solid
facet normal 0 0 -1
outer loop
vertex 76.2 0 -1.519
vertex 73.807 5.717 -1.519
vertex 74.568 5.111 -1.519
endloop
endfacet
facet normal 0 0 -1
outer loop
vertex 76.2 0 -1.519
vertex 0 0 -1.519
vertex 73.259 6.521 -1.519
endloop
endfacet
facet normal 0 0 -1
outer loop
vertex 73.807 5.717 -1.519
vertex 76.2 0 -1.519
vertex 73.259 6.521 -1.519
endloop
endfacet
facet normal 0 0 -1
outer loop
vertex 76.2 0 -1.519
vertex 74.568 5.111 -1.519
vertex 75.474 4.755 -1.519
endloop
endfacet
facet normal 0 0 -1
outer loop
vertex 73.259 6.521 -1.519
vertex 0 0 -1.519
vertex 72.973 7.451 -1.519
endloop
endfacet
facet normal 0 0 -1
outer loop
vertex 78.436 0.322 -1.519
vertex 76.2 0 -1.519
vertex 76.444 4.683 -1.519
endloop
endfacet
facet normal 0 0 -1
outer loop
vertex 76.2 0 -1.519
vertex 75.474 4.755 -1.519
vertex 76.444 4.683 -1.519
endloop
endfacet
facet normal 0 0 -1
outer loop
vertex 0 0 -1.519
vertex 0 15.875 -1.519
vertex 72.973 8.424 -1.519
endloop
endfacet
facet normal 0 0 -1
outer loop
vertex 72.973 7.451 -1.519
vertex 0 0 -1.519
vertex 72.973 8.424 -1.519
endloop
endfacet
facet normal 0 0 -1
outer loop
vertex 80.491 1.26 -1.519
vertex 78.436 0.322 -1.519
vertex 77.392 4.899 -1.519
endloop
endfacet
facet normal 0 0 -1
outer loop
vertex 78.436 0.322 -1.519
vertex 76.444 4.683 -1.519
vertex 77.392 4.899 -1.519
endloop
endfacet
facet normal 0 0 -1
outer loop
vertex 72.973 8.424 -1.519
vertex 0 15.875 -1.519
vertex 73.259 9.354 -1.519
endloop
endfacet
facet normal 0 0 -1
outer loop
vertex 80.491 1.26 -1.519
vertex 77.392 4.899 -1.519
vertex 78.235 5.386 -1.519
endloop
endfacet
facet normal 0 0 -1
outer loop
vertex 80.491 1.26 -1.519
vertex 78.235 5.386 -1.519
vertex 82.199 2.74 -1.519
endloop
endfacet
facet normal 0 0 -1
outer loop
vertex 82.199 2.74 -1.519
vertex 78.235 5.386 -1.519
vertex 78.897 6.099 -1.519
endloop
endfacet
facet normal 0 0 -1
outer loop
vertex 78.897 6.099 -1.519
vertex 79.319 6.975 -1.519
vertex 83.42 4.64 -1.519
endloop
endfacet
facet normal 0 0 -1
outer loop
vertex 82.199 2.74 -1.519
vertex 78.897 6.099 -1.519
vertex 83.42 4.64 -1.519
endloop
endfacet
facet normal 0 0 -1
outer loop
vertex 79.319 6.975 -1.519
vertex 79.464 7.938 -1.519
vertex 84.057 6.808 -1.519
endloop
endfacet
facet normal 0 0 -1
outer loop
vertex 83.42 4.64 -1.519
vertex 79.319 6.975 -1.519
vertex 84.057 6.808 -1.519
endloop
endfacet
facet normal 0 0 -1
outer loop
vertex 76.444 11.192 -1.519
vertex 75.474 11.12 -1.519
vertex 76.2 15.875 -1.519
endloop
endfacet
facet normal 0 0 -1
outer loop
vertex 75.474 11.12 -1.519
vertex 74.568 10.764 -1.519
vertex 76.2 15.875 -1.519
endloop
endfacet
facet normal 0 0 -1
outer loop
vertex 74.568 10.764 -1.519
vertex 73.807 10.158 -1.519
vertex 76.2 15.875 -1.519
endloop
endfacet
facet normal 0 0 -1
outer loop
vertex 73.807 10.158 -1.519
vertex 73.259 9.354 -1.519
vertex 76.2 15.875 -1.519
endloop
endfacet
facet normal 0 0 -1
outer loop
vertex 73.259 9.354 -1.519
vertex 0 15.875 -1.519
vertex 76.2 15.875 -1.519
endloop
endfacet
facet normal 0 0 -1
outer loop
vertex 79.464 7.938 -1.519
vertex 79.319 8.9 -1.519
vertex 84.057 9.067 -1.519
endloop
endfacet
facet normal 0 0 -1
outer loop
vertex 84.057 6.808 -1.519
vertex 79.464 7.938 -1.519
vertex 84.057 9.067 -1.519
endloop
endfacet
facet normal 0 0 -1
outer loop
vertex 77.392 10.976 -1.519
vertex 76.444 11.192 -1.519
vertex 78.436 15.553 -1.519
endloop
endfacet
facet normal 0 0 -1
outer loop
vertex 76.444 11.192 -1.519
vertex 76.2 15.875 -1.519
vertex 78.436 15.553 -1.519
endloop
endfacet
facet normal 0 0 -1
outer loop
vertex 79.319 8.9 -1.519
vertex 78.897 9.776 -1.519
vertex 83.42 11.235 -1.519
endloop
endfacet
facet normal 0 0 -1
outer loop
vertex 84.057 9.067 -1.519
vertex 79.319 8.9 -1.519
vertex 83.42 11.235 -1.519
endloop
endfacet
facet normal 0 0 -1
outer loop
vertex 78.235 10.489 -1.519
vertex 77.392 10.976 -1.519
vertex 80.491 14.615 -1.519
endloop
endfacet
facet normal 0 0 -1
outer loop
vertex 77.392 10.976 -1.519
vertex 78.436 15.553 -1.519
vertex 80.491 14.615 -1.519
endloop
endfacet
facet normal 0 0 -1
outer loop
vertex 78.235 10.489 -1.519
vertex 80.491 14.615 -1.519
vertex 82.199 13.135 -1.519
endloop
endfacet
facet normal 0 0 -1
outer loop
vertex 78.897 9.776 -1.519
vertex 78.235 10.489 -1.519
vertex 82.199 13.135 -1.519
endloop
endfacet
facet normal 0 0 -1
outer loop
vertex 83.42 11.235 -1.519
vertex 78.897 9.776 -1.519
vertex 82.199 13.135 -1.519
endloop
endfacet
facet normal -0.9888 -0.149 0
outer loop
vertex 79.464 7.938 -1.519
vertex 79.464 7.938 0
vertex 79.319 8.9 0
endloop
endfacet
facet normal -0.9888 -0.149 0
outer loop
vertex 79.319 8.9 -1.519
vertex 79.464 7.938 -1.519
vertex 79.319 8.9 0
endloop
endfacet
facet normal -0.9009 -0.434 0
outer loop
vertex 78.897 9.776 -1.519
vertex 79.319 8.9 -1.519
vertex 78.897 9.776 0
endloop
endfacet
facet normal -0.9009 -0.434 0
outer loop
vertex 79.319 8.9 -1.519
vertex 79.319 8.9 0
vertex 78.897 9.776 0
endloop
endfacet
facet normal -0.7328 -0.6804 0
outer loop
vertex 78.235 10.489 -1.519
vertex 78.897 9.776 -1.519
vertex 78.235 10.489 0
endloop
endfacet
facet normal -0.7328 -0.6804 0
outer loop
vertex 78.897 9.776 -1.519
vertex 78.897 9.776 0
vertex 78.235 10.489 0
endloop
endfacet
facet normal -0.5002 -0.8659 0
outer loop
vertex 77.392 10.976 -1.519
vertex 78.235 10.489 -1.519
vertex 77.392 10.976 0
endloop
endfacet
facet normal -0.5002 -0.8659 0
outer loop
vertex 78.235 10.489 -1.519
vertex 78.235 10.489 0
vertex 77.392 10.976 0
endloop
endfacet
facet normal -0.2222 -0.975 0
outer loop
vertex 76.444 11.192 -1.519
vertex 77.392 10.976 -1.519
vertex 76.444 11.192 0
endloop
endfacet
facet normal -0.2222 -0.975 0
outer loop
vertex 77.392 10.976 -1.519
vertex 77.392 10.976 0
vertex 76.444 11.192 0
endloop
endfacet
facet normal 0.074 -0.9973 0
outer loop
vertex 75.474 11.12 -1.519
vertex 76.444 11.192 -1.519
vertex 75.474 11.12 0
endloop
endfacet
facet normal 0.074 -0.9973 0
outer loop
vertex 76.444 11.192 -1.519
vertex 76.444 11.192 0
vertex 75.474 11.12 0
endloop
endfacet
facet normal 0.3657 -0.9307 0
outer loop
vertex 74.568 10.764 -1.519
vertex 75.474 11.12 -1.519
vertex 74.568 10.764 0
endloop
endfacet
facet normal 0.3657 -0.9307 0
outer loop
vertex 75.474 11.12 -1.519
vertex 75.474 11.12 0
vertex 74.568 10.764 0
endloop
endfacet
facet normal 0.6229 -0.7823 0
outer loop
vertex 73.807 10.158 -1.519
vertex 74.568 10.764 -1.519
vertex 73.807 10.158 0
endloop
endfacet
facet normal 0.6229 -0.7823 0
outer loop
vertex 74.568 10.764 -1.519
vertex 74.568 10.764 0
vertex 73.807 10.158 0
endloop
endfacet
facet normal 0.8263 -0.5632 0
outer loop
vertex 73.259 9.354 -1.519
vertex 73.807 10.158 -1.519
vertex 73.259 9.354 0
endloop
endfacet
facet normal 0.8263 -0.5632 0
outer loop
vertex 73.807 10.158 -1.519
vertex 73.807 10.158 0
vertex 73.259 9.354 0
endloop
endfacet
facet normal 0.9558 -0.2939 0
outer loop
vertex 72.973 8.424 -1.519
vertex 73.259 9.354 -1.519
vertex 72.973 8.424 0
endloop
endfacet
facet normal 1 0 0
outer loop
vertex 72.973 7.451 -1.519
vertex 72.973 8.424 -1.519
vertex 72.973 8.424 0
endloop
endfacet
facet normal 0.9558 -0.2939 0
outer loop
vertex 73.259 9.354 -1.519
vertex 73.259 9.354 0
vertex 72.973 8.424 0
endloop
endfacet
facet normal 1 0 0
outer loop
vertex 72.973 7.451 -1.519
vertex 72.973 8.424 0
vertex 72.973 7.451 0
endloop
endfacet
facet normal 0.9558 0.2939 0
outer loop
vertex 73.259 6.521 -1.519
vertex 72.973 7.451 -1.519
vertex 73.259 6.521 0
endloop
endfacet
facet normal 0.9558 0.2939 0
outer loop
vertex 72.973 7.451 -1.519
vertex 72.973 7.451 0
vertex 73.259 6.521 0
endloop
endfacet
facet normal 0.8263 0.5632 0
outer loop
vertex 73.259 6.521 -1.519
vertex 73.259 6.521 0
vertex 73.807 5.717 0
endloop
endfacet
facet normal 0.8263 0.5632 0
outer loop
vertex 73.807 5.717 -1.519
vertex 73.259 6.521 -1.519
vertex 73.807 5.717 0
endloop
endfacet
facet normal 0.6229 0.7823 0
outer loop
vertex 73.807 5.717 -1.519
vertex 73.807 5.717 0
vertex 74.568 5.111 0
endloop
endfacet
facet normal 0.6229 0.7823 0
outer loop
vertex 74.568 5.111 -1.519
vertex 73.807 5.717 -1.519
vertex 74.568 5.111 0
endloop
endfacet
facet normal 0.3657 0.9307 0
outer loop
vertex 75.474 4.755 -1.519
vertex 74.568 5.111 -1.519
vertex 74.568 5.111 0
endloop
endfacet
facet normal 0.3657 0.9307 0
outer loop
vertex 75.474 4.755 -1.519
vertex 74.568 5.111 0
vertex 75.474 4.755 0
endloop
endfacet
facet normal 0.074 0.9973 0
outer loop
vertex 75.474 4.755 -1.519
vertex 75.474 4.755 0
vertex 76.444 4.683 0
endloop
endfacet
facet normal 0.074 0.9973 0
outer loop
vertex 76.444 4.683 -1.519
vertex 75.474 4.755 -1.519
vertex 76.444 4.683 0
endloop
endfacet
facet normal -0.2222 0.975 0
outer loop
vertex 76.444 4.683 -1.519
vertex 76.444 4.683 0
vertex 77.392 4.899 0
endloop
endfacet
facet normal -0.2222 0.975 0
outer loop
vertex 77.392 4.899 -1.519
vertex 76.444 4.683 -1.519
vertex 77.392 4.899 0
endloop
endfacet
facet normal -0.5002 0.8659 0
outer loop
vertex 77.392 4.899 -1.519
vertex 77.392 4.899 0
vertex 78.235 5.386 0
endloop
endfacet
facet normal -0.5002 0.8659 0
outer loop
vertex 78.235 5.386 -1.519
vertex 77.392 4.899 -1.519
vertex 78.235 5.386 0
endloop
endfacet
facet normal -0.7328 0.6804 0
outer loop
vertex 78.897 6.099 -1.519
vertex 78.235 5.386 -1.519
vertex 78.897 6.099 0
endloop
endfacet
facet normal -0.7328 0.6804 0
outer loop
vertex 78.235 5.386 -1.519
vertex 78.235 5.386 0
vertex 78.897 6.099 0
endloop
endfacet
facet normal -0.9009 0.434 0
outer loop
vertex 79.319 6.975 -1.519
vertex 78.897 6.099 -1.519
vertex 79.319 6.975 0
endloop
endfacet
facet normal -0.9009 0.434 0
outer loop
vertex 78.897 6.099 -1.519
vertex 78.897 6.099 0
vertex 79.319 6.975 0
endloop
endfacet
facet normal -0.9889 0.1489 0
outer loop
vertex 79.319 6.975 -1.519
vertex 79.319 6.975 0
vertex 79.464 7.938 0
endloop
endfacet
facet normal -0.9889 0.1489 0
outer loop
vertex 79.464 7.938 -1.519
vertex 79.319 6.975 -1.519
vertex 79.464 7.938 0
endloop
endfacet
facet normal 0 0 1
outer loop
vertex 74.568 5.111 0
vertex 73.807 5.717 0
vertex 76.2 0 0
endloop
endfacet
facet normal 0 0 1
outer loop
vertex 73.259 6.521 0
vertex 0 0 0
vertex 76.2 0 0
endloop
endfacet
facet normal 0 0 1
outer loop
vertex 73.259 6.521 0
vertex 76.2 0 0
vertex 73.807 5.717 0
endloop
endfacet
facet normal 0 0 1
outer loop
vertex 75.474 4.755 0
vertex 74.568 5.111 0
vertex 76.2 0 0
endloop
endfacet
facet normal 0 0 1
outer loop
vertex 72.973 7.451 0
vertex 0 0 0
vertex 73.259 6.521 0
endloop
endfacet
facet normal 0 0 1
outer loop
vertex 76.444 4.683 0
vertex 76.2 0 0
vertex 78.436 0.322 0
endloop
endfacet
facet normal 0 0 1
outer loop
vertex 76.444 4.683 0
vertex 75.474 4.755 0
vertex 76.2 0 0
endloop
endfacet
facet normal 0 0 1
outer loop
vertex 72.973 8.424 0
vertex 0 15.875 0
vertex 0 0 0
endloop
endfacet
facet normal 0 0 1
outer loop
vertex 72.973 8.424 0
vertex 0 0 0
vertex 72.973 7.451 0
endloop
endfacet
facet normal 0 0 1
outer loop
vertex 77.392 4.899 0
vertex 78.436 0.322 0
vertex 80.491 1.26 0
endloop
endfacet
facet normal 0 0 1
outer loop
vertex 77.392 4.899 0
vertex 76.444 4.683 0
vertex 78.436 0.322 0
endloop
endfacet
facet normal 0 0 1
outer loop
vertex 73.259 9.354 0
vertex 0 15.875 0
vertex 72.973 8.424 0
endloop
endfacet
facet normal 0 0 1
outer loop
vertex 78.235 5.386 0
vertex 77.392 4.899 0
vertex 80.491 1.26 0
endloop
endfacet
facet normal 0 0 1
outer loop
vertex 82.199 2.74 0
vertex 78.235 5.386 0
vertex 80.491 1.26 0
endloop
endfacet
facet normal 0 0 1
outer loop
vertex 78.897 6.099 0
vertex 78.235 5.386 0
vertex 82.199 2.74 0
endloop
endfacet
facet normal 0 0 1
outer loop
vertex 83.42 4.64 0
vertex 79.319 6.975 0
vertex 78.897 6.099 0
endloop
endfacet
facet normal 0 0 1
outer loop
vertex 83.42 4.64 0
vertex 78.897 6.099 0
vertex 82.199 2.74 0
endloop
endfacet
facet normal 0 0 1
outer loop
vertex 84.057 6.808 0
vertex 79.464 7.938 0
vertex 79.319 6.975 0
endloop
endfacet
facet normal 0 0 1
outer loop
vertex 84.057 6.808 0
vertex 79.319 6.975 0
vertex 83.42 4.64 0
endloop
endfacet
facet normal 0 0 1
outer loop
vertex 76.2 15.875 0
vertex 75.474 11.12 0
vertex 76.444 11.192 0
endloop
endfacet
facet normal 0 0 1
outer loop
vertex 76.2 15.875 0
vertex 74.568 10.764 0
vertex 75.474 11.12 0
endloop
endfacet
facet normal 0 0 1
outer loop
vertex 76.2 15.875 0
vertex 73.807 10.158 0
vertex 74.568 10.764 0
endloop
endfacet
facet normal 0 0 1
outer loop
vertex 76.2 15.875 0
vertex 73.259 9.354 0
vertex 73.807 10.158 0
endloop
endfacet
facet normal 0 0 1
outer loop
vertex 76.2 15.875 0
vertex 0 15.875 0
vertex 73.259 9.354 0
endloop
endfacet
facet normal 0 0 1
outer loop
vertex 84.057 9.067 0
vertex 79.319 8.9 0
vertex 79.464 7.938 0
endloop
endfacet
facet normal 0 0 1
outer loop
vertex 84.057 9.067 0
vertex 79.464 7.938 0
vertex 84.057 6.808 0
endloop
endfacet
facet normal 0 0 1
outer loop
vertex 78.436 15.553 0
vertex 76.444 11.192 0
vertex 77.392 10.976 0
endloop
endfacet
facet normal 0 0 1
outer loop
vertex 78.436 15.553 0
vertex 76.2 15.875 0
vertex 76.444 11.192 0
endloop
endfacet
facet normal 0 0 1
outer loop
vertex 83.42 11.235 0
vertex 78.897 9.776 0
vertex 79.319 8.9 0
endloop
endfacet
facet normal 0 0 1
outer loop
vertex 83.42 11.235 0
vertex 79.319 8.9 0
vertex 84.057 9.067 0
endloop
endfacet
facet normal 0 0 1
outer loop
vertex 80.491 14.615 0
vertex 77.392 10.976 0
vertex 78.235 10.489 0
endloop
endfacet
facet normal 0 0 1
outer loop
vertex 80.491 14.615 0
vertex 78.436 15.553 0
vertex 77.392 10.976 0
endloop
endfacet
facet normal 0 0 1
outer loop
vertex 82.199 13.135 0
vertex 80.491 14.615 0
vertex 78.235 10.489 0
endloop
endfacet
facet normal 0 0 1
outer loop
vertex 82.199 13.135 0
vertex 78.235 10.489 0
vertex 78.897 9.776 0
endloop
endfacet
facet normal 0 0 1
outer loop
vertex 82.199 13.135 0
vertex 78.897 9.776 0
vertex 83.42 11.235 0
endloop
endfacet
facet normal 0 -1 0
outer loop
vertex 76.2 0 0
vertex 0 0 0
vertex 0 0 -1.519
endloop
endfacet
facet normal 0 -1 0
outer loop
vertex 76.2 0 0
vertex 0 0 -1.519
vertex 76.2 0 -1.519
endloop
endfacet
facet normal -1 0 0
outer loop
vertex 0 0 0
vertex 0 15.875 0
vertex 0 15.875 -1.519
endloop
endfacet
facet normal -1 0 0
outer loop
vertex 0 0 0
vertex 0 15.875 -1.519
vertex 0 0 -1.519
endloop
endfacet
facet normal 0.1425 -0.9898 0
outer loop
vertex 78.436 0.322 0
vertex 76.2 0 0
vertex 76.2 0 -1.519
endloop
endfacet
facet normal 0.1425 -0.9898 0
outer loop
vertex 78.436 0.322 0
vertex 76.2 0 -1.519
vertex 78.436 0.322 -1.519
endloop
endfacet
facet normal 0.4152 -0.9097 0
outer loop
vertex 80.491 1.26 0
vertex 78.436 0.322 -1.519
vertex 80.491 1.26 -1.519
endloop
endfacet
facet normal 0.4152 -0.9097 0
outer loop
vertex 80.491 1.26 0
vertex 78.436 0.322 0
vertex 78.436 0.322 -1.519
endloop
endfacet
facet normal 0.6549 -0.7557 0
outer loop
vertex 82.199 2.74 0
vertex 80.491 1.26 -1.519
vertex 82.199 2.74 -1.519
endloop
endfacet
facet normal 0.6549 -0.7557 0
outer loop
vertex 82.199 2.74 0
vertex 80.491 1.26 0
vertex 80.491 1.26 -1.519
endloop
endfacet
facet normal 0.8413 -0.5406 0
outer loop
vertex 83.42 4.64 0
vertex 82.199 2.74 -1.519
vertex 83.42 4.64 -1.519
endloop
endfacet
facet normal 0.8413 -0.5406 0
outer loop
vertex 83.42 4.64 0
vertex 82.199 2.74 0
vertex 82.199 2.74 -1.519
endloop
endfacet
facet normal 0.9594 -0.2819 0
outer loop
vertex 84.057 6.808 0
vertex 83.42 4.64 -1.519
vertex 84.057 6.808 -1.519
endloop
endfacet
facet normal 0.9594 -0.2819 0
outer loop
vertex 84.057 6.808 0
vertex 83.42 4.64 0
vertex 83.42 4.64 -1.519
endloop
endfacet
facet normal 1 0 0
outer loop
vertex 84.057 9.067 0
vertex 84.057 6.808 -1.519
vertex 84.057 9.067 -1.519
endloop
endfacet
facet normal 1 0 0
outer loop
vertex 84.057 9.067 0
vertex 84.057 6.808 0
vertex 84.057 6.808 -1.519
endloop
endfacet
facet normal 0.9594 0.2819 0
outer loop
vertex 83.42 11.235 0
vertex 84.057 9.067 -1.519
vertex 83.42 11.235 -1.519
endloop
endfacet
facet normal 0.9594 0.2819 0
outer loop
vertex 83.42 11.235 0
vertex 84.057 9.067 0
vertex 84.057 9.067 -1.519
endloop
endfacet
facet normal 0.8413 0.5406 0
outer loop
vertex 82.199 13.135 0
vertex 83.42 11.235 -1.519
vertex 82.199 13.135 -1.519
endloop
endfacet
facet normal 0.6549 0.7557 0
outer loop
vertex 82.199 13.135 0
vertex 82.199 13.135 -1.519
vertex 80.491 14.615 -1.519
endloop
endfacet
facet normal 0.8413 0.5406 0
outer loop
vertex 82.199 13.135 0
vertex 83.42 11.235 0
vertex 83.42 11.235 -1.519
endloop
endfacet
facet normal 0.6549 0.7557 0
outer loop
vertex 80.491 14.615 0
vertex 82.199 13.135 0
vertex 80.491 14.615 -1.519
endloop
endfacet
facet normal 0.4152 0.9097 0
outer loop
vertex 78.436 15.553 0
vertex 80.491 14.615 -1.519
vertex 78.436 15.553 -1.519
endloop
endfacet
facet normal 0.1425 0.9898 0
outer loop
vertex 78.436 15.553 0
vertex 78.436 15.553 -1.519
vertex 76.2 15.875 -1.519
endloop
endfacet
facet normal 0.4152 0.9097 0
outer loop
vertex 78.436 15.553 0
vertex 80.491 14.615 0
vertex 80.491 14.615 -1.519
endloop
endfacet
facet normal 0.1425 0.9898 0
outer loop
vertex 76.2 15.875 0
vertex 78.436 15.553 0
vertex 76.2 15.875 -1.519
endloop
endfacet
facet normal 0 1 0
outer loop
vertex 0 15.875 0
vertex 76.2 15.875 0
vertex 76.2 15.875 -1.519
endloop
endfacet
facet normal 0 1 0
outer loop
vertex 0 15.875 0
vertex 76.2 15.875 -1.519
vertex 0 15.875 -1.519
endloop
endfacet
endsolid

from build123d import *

# Parameters (mm, degrees)
SKETCH1_R          = 3.2639
BASE_FLANGE1_DEPTH = 1.51892


# Sheet-metal steps are written as plain solids
with BuildPart() as part:
    # Sketch1 → Base-Flange1 (new body)
    with BuildSketch(Plane.XY):
        with BuildLine():
            Line((0, 0), (76.2, 0))
            ThreePointArc((76.2, 0), (84.1375, 7.9375), (76.2, 15.875))
            Line((76.2, 15.875), (0, 15.875))
            Line((0, 15.875), (0, 0))
        make_face()
        with Locations((76.2, 7.9375)):
            Circle(SKETCH1_R, mode=Mode.SUBTRACT)
    extrude(amount=-BASE_FLANGE1_DEPTH)


solid = part.part
